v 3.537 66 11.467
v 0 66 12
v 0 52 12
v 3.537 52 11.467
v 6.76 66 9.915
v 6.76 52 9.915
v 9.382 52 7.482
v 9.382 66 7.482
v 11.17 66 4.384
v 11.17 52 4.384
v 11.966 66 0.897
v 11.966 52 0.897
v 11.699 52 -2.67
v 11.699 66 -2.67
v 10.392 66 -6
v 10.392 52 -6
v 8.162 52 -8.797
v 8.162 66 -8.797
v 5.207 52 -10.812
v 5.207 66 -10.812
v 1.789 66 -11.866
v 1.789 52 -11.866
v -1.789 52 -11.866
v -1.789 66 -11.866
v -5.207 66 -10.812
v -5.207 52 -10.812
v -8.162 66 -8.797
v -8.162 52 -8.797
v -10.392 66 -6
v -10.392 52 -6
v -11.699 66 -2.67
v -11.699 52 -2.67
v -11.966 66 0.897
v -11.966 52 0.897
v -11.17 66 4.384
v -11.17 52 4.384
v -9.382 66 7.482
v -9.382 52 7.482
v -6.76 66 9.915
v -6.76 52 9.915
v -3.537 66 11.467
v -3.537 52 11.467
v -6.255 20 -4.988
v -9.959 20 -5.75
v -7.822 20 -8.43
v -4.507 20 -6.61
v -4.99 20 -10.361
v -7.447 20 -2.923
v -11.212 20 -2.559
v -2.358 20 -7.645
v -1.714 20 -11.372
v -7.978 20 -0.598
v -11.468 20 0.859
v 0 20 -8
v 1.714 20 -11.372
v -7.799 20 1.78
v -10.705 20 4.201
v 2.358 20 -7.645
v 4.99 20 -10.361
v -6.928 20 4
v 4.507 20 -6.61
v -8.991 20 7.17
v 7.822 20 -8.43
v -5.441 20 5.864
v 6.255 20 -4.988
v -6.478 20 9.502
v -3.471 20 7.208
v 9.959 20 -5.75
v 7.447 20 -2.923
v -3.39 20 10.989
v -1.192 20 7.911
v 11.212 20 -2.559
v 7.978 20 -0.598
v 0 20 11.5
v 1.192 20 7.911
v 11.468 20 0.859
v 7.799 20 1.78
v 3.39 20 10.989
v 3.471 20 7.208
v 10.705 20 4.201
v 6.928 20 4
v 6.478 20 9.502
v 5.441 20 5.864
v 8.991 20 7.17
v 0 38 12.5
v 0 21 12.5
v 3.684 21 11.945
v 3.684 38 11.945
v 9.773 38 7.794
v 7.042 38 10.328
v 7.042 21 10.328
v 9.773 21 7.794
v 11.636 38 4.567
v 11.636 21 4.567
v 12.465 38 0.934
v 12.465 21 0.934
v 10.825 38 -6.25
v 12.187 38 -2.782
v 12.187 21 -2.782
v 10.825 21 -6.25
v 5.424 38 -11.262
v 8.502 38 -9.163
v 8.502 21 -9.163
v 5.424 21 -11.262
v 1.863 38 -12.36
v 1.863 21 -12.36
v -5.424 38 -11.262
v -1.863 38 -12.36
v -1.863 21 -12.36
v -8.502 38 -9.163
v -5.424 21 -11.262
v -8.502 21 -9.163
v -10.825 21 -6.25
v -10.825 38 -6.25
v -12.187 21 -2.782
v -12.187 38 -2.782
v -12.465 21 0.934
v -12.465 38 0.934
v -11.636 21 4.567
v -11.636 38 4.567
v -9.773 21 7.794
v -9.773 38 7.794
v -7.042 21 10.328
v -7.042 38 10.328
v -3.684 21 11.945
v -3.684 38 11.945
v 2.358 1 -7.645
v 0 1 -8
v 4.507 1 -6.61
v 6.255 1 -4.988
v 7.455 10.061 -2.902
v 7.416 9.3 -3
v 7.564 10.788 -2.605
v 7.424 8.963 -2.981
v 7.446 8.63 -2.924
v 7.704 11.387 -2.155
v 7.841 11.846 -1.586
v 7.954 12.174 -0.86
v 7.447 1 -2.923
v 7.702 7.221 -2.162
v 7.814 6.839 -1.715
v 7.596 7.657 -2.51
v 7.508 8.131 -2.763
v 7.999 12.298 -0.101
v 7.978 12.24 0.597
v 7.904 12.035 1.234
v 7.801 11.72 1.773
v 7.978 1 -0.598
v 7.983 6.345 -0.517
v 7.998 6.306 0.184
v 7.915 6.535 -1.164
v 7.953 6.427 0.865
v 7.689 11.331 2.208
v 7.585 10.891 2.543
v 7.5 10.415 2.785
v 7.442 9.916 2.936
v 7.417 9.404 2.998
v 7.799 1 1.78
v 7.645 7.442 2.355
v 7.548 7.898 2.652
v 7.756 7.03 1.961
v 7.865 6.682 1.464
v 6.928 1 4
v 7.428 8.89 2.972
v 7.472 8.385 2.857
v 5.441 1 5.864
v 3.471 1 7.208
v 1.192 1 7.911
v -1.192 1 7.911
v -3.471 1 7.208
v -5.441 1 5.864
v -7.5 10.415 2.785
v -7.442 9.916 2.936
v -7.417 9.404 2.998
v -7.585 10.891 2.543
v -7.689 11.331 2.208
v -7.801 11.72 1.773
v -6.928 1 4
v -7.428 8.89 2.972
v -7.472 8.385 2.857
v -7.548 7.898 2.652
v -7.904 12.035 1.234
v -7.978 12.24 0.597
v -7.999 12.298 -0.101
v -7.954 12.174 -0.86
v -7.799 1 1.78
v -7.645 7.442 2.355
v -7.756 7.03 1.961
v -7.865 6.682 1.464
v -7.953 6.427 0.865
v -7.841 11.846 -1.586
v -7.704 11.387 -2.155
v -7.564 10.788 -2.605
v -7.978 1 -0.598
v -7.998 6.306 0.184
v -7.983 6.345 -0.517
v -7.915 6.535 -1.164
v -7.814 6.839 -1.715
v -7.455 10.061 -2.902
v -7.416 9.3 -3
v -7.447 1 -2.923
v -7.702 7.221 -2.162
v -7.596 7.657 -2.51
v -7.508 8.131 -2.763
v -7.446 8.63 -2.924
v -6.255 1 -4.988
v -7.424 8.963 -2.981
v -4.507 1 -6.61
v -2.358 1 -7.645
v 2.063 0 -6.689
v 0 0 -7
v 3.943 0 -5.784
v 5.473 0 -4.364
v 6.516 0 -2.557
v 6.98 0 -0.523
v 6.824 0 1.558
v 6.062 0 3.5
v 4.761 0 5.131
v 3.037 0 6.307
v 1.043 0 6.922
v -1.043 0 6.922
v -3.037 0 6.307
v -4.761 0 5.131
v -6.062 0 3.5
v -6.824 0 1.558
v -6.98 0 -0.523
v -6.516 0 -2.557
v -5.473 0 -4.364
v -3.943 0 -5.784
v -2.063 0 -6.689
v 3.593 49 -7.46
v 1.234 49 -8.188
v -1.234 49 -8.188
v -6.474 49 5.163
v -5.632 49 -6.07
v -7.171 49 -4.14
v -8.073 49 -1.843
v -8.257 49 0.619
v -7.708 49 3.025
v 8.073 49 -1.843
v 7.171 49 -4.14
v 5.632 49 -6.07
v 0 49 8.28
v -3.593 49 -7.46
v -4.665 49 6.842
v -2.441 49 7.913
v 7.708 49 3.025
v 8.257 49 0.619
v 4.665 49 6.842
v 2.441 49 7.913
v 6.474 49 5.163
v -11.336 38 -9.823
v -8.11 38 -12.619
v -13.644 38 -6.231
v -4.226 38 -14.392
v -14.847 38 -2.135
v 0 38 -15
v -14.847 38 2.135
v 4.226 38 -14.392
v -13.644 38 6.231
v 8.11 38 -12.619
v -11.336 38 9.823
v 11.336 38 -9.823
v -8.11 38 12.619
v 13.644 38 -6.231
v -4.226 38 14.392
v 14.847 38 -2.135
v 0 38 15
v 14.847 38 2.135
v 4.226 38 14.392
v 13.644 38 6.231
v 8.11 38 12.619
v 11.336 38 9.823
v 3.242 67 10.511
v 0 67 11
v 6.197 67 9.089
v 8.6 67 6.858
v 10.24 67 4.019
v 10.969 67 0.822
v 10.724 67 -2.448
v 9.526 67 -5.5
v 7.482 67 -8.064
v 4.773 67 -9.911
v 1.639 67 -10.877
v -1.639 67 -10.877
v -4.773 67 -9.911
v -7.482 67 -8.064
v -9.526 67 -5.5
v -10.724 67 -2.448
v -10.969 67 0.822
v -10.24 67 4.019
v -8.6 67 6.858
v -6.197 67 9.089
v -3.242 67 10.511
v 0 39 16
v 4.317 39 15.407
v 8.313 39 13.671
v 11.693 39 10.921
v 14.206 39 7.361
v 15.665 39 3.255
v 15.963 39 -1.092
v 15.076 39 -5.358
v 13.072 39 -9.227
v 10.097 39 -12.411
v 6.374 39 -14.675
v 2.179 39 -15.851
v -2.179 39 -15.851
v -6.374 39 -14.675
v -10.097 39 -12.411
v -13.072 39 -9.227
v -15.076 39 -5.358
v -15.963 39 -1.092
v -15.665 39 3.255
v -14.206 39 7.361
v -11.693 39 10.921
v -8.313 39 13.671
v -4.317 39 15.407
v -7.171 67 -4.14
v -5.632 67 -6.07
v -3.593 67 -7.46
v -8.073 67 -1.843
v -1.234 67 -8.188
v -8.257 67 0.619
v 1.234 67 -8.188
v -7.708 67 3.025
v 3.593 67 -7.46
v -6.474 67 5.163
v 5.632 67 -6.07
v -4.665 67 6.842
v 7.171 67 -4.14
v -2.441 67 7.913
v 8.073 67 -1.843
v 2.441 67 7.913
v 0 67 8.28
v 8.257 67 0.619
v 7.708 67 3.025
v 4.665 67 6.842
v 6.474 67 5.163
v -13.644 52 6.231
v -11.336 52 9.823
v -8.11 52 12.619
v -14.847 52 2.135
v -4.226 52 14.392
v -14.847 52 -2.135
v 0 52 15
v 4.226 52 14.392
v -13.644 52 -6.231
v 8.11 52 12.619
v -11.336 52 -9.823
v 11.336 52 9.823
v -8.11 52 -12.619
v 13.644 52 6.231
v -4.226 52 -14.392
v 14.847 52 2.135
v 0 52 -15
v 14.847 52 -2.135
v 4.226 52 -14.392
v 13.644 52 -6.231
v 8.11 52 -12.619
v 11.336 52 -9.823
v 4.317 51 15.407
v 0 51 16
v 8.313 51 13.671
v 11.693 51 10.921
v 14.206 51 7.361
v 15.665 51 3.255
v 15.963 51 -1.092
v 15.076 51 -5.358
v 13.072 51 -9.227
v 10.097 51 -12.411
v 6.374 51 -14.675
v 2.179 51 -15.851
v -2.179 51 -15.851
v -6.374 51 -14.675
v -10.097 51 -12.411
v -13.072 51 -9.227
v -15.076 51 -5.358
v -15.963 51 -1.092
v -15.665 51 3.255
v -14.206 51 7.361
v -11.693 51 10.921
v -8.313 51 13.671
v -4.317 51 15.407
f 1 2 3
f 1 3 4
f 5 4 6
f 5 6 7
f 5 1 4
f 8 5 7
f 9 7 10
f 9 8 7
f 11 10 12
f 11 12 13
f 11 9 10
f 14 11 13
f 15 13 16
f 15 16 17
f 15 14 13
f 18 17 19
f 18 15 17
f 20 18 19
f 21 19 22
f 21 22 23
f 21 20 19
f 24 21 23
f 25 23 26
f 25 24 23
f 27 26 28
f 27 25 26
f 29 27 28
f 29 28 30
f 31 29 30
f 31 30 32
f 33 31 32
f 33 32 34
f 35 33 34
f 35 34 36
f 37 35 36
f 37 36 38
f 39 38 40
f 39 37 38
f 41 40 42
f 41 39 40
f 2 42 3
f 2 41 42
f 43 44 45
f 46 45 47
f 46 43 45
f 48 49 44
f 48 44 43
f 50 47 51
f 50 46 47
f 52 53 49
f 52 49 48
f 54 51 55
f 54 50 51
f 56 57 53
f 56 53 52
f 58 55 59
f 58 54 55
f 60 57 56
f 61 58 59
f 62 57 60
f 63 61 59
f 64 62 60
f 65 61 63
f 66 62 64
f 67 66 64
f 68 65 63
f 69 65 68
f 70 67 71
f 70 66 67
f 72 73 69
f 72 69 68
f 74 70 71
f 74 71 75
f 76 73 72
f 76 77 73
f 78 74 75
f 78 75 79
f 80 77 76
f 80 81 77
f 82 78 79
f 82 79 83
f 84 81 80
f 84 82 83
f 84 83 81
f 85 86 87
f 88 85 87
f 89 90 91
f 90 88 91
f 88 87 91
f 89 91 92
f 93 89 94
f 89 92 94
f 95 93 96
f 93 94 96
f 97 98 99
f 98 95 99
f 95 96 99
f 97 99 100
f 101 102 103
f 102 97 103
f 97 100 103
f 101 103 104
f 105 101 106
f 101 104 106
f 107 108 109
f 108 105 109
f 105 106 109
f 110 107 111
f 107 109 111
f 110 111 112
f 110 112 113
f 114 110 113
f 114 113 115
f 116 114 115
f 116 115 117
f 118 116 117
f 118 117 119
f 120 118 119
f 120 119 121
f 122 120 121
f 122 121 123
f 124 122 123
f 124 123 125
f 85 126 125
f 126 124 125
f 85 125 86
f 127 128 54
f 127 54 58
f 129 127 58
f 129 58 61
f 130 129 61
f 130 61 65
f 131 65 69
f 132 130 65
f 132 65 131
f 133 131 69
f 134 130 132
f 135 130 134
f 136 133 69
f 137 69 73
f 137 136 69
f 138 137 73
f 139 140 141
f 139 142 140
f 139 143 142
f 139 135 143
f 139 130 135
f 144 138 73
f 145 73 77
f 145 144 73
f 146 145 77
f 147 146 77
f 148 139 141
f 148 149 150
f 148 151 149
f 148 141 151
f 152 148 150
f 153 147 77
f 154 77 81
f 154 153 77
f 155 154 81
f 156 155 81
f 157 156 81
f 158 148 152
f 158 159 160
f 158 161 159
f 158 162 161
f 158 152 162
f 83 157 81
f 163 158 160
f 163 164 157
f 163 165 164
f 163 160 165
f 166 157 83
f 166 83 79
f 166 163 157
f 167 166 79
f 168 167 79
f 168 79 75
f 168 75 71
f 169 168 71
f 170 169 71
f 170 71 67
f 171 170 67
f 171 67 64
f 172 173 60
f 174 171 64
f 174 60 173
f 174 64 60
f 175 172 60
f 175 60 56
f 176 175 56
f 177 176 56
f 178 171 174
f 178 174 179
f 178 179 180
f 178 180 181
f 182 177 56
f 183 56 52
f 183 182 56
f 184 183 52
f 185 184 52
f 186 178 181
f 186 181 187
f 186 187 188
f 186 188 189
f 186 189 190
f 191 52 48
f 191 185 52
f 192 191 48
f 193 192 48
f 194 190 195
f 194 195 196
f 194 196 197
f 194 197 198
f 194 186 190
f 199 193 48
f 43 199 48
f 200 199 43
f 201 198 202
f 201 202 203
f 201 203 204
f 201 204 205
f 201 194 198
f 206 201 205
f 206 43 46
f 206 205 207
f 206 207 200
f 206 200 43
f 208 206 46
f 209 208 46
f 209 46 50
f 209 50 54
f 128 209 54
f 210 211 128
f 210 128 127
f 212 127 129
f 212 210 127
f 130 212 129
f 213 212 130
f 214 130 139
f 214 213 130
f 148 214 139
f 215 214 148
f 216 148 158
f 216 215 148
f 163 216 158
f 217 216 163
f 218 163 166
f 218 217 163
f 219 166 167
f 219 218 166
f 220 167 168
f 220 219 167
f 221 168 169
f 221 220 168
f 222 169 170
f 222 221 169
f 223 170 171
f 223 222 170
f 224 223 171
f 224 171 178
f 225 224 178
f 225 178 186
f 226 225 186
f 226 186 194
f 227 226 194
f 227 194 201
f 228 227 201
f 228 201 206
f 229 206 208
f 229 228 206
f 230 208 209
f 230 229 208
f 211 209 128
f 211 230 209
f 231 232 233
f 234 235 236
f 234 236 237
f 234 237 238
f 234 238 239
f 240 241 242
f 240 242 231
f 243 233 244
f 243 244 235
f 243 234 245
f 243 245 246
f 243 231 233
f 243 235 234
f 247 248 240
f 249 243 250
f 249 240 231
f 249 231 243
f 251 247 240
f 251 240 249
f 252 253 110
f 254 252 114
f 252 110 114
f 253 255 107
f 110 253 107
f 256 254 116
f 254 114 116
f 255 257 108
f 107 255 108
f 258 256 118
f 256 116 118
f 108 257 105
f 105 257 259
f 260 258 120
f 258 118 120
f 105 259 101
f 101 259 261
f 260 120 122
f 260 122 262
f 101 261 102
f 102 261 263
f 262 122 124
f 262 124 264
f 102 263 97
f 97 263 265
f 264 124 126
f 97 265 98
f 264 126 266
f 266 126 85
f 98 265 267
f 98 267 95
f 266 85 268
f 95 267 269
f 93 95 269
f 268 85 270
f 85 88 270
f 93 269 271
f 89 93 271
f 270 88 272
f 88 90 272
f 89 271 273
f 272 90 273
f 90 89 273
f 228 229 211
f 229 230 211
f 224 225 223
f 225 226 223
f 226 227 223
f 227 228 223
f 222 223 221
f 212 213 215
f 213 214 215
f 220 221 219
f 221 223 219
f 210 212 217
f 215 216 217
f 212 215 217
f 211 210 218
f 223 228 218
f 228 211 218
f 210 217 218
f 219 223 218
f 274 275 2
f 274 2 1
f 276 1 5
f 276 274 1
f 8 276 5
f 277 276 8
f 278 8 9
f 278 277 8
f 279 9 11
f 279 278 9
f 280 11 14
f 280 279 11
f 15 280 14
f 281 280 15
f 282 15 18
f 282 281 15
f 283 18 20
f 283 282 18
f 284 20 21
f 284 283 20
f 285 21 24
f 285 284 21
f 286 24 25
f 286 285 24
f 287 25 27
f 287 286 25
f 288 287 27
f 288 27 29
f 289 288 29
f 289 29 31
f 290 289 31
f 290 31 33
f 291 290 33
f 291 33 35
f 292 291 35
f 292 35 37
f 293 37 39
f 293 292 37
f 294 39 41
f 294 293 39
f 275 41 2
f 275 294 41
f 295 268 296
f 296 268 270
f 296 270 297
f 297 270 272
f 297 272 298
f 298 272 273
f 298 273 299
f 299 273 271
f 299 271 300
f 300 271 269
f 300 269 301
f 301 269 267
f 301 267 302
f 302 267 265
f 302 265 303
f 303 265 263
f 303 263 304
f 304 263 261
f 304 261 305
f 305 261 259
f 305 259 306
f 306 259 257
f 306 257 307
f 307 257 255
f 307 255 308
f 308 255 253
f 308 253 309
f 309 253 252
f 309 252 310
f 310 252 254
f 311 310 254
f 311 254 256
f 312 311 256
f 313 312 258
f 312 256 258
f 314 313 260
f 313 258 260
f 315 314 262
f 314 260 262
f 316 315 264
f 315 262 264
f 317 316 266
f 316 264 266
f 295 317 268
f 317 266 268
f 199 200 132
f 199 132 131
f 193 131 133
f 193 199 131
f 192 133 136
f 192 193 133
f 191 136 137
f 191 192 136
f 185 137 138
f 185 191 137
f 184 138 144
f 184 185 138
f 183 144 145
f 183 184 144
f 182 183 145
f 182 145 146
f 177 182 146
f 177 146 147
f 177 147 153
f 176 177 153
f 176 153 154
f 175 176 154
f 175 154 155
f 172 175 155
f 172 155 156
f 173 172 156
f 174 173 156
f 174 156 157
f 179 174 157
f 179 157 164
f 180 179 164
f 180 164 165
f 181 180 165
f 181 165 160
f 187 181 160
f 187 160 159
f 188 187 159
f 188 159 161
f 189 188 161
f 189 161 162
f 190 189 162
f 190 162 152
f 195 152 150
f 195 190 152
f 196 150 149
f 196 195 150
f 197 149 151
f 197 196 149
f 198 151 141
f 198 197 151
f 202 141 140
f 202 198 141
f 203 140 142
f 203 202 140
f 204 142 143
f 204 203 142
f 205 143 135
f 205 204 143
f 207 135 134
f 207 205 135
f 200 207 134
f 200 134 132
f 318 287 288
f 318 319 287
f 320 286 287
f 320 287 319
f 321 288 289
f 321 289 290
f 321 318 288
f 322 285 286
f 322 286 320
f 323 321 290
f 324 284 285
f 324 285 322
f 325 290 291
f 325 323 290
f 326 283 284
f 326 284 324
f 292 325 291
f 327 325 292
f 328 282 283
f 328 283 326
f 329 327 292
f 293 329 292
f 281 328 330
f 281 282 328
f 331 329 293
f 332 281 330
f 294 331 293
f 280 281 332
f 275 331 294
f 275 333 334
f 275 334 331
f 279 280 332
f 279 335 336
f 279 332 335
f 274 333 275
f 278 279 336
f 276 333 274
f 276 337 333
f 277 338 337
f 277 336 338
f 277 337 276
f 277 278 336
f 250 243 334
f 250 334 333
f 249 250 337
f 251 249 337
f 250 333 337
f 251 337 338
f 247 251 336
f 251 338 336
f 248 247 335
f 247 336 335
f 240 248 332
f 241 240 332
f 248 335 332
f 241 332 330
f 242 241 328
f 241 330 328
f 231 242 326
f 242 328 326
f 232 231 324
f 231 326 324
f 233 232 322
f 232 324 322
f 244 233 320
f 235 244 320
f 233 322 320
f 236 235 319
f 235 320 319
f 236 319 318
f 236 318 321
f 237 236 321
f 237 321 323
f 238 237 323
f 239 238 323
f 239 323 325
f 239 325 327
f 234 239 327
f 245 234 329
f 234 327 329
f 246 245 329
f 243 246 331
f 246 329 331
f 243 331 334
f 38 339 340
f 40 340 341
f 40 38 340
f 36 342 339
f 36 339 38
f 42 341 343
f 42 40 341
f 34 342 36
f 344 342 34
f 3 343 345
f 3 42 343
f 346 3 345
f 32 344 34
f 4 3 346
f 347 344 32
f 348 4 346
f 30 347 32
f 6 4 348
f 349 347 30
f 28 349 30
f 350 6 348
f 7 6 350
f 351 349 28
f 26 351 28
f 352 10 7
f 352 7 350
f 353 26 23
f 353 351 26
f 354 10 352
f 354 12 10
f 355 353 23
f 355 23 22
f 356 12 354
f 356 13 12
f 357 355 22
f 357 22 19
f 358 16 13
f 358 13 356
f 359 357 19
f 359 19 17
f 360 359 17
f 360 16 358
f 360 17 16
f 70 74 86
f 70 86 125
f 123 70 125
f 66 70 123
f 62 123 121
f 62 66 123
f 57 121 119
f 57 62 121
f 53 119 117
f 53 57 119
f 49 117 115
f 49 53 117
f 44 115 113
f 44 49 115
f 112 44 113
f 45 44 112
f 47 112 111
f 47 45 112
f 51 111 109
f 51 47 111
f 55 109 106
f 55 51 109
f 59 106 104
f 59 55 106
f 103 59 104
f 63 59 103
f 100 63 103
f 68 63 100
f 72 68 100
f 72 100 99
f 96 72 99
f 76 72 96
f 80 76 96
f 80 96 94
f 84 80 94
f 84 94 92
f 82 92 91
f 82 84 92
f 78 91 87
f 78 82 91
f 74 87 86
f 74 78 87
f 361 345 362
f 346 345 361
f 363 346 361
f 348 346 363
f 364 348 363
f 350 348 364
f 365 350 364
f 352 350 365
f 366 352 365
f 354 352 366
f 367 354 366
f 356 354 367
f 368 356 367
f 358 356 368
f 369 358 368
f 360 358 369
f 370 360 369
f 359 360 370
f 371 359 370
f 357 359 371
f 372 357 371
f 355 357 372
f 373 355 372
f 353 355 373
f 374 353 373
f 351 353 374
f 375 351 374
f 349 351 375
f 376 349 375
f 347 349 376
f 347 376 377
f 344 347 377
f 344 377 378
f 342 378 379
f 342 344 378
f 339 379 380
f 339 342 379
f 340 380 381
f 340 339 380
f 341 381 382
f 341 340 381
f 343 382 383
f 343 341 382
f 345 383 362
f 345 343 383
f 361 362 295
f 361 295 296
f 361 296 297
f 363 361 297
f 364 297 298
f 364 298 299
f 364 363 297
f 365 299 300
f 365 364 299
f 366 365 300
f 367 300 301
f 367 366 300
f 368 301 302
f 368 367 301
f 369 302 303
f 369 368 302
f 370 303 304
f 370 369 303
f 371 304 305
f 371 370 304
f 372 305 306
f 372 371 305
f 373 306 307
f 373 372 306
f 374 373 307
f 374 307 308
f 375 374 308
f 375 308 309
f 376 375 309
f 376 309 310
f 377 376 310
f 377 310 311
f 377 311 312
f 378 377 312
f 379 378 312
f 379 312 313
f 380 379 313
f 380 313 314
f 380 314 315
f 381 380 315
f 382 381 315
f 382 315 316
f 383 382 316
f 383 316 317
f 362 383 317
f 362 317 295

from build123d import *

# Parameters (mm, degrees)
SKETCH1_R               = 12.5
BOSS_EXTRUDE1_DEPTH     = 67
SKETCH14_R              = 16
BOSS_EXTRUDE2_DEPTH     = 29
SKETCH4_R               = 8.2804
CUT_EXTRUDE2_DEPTH      = 18
SKETCH8_OUTSIDE_W       = 50.17
SKETCH8_OUTSIDE_H       = 50.17
SKETCH8_OUTSIDE_R       = 12
CUT_EXTRUDE4_DEPTH      = 15
CHAMFER1_SIZE           = 1
SKETCH25_OUTSIDE_W      = 50.17
SKETCH25_OUTSIDE_H      = 50.17
SKETCH25_OUTSIDE_R      = 8
CUT_EXTRUDE7_DEPTH      = 20
CHAMFER2_SIZE           = 1
CUT_EXTRUDE8_DEPTH      = 71.717748833
CUT_EXTRUDE8_DEPTH_BACK = 71.717748833
SKETCH26_R              = 3


with BuildPart() as part:
    # Sketch1 → Boss-Extrude1 (new body)
    with BuildSketch(Plane(origin=(0, 0, 0), x_dir=(1, 0, 0), z_dir=(0, 1, 0))):
        with Locations(Location((0, 0, 0), (0, 0, 270))):
            Circle(SKETCH1_R)
    extrude(amount=BOSS_EXTRUDE1_DEPTH)

    # Sketch14 → Boss-Extrude2 (add)
    with BuildSketch(Plane(origin=(0, 67, 0), x_dir=(1, 0, 0), z_dir=(0, 1, 0))):
        with Locations(Location((0, 0, 0), (0, 0, 270))):
            Circle(SKETCH14_R)
    extrude(amount=-BOSS_EXTRUDE2_DEPTH)

    # Sketch4 → Cut-Extrude2 (cut)
    with BuildSketch(Plane(origin=(0, 67, 0), x_dir=(1, 0, 0), z_dir=(0, 1, 0))):
        with Locations(Location((0, 0, 0), (0, 0, 270))):
            Circle(SKETCH4_R)
    extrude(amount=-CUT_EXTRUDE2_DEPTH, mode=Mode.SUBTRACT)

    # Sketch8 outside → Cut-Extrude4 (cut)
    with BuildSketch(Plane(origin=(0, 67, 0), x_dir=(1, 0, 0), z_dir=(0, 1, 0))):
        Rectangle(SKETCH8_OUTSIDE_W, SKETCH8_OUTSIDE_H)
        with Locations(Location((0, 0, 0), (0, 0, 270))):
            Circle(SKETCH8_OUTSIDE_R, mode=Mode.SUBTRACT)
    extrude(amount=-CUT_EXTRUDE4_DEPTH, mode=Mode.SUBTRACT)

    # Chamfer1
    chamfer1_edges = [part.edges().sort_by_distance(p)[0] for p in [
        (0, 52, -16),
        (0, 38, -16),
    ]]
    chamfer(chamfer1_edges, length=CHAMFER1_SIZE)

    # Sketch25 outside → Cut-Extrude7 (cut)
    with BuildSketch(Plane.XZ):
        Rectangle(SKETCH25_OUTSIDE_W, SKETCH25_OUTSIDE_H)
        with Locations(Location((0, 0, 0), (0, 0, 270))):
            Circle(SKETCH25_OUTSIDE_R, mode=Mode.SUBTRACT)
    extrude(amount=-CUT_EXTRUDE7_DEPTH, mode=Mode.SUBTRACT)

    # Chamfer2
    chamfer2_edges = [part.edges().sort_by_distance(p)[0] for p in [
        (0, 67, -12),
        (0, 20, -12.5),
        (0, 0, 8),
    ]]
    chamfer(chamfer2_edges, length=CHAMFER2_SIZE)

    # Sketch26 → Cut-Extrude8 (cut, two sides: drawn at the far end of the back side and taken through both)
    with BuildSketch(Plane(origin=(0, 0, 0), x_dir=(0, 0, -1), z_dir=(1, 0, 0)).offset(-CUT_EXTRUDE8_DEPTH_BACK)):
        with Locations((0, 9.3)):
            Circle(SKETCH26_R)
    extrude(amount=CUT_EXTRUDE8_DEPTH + CUT_EXTRUDE8_DEPTH_BACK, mode=Mode.SUBTRACT)


solid = part.part
